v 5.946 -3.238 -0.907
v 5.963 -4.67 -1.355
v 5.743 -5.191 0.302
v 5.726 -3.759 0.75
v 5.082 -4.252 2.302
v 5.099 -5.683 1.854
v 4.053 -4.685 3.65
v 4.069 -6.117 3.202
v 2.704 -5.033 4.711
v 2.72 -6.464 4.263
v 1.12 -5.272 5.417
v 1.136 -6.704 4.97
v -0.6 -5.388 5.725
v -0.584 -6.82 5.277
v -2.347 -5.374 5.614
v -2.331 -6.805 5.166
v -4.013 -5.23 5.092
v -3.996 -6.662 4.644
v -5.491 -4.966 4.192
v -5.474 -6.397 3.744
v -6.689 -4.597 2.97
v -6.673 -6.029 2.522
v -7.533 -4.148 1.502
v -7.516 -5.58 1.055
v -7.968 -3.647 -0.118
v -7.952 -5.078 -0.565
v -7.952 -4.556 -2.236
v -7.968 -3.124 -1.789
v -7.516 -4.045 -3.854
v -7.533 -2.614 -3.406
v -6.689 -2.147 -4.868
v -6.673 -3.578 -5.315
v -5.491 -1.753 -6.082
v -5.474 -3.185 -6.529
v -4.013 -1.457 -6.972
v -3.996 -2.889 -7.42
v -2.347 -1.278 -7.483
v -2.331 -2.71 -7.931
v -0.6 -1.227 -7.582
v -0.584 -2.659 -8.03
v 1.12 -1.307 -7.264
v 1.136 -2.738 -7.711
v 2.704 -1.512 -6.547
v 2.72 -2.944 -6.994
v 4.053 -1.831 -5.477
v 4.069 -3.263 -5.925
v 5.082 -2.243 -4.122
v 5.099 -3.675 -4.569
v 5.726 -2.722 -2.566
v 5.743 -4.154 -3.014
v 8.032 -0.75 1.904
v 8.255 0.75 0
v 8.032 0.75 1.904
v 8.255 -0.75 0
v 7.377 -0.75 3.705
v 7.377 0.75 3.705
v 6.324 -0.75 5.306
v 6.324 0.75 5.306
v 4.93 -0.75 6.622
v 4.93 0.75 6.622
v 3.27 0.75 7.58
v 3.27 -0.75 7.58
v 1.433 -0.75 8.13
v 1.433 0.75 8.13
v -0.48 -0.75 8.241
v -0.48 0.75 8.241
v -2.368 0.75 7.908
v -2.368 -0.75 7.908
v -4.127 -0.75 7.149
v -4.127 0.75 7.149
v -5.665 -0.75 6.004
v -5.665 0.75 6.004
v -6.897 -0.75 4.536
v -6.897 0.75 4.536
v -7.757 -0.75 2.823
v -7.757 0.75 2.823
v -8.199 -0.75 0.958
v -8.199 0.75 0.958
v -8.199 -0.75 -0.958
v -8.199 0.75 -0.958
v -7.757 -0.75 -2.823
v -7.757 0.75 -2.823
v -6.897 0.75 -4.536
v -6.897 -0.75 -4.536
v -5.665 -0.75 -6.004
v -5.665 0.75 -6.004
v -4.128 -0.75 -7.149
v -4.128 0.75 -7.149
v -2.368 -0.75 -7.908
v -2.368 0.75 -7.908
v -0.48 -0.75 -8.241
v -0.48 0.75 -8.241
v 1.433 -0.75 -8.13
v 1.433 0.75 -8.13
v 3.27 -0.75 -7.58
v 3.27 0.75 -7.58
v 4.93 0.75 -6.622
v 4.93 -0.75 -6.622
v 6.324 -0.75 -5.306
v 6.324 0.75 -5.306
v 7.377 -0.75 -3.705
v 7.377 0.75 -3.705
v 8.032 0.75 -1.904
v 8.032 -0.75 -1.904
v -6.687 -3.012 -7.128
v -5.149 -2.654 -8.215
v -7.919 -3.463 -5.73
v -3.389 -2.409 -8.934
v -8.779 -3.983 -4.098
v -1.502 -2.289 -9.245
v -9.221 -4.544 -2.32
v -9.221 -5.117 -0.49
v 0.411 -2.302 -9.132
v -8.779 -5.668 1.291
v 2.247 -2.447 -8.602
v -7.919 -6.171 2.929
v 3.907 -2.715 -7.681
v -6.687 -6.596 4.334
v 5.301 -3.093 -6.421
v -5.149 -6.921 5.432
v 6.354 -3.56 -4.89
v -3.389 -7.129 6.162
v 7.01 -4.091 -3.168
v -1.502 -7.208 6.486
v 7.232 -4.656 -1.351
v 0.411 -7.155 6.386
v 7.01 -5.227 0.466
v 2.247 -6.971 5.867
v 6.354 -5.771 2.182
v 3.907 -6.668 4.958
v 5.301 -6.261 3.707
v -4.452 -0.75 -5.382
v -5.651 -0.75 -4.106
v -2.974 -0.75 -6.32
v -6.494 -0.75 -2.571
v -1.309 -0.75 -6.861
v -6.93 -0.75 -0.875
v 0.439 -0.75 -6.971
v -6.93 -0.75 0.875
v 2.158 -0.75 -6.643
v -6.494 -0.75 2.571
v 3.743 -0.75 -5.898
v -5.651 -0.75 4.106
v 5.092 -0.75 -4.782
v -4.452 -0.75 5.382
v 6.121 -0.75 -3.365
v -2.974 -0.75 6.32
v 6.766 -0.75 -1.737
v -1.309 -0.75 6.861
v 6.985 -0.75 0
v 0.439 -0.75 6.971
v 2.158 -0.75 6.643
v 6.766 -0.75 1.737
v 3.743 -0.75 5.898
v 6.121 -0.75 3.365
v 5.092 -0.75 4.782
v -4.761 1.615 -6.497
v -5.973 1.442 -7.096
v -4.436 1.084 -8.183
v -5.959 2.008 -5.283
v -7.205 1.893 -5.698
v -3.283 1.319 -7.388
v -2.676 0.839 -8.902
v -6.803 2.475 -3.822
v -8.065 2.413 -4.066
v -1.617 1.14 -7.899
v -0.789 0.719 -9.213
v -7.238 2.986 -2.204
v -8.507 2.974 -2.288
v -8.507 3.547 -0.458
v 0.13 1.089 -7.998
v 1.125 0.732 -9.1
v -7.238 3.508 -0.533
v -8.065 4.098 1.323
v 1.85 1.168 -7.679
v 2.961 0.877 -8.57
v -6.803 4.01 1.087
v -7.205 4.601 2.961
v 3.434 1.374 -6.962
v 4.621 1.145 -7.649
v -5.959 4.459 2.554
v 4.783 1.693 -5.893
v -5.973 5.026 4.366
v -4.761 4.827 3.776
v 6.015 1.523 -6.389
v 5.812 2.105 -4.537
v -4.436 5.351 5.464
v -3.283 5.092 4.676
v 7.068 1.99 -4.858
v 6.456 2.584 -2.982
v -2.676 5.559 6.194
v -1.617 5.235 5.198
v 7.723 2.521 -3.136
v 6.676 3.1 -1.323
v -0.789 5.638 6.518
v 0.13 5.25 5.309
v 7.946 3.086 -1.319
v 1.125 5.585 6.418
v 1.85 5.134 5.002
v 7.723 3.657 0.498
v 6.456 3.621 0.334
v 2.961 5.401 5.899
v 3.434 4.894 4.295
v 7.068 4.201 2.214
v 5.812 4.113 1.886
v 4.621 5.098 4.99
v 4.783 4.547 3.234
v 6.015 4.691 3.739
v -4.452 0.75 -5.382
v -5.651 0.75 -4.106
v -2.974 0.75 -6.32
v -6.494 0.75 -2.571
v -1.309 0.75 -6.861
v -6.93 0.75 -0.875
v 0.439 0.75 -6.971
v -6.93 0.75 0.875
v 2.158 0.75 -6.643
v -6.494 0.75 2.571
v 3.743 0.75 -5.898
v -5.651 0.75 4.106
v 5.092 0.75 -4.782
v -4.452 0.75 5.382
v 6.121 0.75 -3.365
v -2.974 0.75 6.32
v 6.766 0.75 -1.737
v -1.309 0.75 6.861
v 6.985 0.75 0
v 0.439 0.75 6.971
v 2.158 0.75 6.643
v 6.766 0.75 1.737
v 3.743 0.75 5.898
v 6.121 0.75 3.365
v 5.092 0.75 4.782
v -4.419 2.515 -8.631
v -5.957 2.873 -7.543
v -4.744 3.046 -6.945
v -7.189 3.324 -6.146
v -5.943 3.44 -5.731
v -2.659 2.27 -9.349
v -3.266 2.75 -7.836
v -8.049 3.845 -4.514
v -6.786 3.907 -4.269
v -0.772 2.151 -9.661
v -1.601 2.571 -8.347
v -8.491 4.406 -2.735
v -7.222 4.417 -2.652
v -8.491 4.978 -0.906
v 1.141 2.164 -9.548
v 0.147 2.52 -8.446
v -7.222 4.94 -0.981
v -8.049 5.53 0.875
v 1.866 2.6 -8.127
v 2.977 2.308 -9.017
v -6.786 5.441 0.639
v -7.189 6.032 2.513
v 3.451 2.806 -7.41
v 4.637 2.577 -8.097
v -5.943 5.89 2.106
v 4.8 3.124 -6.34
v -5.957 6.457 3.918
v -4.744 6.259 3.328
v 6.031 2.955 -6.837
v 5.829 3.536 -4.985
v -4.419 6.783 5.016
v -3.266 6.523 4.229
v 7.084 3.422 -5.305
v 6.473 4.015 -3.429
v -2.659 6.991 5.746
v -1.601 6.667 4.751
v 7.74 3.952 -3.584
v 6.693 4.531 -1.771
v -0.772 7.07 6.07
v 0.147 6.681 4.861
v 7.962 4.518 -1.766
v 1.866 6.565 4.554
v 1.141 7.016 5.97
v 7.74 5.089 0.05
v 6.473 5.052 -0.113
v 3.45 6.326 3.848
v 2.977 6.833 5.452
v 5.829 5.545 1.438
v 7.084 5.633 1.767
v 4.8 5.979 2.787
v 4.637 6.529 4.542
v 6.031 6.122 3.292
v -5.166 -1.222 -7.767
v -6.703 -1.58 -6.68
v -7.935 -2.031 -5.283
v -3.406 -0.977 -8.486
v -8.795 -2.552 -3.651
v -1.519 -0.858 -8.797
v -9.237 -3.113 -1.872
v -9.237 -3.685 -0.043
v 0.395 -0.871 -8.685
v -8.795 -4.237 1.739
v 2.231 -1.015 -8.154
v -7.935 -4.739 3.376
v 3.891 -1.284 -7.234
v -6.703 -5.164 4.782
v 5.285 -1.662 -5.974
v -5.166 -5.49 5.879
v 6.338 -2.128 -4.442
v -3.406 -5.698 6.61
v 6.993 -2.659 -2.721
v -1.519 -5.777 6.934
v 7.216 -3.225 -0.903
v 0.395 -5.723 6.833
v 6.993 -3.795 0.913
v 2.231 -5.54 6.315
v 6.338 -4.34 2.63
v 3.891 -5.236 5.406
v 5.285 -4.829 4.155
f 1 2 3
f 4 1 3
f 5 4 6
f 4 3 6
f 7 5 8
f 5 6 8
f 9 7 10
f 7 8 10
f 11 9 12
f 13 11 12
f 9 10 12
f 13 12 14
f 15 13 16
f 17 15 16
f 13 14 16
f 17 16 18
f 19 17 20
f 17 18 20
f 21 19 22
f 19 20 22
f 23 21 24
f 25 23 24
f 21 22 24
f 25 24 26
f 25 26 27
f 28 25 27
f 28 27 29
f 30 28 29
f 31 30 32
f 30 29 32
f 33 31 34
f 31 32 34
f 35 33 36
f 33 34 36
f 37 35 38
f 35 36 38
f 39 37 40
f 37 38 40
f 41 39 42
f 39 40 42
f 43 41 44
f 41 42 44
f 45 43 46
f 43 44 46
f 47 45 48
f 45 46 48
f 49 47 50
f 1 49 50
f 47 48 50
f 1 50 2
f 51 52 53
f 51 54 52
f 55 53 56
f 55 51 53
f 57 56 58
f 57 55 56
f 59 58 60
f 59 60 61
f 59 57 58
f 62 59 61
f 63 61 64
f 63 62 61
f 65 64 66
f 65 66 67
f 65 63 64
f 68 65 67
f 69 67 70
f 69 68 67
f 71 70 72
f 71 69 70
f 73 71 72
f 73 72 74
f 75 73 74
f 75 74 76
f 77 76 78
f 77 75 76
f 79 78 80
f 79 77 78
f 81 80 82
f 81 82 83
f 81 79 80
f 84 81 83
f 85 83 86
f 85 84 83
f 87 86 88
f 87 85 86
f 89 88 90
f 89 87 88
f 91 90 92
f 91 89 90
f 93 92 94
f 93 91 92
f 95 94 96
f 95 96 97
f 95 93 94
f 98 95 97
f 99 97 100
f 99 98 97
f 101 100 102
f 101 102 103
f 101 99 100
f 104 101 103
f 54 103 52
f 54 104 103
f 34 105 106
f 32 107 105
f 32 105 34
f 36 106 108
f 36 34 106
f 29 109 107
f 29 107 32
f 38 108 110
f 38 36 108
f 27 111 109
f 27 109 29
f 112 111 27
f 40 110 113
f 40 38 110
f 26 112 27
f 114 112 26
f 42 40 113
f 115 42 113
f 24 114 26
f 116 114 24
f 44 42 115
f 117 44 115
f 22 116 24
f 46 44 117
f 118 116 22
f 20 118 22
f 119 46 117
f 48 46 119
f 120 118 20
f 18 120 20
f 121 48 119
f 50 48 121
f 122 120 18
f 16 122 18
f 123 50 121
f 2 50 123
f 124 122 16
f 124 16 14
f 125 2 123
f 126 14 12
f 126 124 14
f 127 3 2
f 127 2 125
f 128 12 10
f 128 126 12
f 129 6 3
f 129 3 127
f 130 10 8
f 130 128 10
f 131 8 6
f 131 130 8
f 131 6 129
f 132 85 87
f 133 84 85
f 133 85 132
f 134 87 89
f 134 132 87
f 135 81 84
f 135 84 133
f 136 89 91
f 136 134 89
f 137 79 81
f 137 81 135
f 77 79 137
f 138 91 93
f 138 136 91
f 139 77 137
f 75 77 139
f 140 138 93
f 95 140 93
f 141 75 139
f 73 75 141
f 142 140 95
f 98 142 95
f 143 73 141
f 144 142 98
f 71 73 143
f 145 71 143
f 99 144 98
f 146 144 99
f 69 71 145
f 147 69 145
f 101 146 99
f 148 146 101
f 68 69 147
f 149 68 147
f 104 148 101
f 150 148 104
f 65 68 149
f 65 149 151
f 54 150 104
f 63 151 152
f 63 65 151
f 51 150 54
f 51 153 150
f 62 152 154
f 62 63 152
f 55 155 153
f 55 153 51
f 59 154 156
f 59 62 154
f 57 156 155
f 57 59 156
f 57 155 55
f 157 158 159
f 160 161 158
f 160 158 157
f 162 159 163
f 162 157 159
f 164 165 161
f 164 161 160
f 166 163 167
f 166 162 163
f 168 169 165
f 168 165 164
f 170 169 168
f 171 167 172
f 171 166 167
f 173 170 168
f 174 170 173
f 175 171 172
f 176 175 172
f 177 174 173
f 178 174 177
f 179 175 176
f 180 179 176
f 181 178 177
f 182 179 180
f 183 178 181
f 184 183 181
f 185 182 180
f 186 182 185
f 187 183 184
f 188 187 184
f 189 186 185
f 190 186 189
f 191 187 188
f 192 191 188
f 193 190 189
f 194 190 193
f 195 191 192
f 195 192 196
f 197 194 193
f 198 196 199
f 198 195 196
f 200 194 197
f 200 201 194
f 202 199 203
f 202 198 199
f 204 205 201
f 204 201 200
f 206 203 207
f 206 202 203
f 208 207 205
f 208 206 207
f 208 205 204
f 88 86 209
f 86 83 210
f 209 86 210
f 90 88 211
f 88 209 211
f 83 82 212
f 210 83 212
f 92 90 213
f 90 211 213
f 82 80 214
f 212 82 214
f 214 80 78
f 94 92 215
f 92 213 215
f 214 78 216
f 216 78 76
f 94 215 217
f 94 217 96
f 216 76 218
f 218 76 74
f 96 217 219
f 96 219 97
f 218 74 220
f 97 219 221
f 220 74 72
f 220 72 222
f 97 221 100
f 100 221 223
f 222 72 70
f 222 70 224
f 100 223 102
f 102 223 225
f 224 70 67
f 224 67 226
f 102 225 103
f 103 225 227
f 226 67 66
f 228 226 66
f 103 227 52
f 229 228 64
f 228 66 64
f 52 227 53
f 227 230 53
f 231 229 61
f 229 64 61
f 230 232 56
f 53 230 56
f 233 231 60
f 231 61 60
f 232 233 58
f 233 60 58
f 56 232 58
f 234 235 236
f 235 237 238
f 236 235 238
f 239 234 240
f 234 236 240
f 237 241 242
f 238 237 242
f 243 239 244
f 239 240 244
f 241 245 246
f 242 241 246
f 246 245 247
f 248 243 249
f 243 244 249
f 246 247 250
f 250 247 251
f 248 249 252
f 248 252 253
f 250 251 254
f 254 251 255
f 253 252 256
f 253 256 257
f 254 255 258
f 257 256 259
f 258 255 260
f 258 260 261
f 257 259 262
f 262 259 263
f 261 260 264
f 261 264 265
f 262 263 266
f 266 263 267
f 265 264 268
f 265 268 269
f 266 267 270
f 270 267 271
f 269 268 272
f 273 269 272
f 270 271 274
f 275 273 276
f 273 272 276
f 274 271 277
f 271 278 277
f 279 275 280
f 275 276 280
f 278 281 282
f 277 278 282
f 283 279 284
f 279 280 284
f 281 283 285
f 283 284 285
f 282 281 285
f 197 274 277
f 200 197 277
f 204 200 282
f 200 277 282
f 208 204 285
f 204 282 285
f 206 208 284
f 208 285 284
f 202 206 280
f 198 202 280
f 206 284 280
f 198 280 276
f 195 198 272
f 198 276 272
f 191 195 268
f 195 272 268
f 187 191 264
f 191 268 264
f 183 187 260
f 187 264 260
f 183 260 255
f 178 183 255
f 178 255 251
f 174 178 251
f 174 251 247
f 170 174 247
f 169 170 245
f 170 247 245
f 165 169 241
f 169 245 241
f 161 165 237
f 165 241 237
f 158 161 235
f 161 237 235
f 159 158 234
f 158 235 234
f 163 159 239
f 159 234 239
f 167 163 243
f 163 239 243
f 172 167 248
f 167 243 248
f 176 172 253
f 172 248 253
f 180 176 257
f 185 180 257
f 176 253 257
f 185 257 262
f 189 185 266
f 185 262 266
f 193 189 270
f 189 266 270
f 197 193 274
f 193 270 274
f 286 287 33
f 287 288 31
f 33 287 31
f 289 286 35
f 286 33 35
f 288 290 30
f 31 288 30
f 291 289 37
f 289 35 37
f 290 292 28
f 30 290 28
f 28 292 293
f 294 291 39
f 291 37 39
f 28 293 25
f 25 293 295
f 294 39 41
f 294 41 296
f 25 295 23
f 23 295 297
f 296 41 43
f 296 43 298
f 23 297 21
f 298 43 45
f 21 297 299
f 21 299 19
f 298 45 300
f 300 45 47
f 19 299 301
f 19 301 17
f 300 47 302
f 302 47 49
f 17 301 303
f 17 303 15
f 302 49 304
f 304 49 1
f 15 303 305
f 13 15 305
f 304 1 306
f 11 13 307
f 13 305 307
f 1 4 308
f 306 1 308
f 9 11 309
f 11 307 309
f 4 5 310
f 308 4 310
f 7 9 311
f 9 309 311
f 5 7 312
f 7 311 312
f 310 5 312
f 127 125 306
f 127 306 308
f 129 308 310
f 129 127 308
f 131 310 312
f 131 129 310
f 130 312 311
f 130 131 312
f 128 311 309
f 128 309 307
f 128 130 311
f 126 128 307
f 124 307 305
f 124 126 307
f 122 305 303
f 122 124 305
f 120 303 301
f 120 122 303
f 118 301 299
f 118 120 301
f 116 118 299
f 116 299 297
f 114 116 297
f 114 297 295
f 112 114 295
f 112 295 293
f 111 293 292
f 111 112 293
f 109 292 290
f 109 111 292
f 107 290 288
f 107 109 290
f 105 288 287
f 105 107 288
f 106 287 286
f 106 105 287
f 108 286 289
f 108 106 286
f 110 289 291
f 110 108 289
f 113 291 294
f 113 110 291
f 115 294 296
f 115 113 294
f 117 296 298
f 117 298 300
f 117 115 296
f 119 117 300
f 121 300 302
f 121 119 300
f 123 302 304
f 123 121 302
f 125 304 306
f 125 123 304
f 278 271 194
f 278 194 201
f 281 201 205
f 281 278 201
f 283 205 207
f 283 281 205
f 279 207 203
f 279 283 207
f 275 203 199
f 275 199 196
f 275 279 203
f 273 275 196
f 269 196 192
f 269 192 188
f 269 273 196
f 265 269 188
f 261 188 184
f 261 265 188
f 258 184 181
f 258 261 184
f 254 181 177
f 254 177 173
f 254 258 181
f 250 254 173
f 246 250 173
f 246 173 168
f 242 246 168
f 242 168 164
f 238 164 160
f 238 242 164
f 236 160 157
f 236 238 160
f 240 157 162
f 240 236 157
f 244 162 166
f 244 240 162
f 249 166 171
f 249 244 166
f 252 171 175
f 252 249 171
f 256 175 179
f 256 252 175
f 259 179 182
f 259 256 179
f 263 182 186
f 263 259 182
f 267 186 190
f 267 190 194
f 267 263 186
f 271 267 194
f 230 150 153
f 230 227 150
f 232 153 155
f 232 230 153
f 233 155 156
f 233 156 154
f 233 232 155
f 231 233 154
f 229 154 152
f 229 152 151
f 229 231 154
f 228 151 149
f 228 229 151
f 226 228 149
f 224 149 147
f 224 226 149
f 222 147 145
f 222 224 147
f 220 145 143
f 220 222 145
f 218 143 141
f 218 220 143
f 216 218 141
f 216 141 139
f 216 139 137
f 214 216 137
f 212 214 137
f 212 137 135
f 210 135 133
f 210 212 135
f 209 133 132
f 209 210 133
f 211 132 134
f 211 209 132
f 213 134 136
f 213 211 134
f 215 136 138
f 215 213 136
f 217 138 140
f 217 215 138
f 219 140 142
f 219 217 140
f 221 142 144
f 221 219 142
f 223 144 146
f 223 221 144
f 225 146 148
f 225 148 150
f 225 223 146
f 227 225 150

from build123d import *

# Parameters (mm, degrees)
F7_R      = 8.255
F7_R_2    = 6.985
F8_DEPTH  = 1.5
F5_R      = 8.255
F5_R_2    = 6.985
F9_DEPTH  = 0.75
F6_R      = 8.255
F6_R_2    = 6.985
F10_DEPTH = 1.5


with BuildPart() as f8:
    # F7 (on face) → F8 (new body)
    with BuildSketch(Plane(origin=(0.054607, -4.702362, -1.470471), x_dir=(0.999939, 0.010578, 0.003308), z_dir=(0.011083, -0.954365, -0.298438))):
        with Locations((-1.076741, 0.100641)):
            Circle(F7_R)
        with Locations((-1.076741, 0.100641)):
            Circle(F7_R_2, mode=Mode.SUBTRACT)
    extrude(amount=-F8_DEPTH)


with BuildPart() as f9:
    # F5 (on Front) → F9 (new body, symmetric)
    with BuildSketch(Plane.XZ):
        Circle(F5_R)
        Circle(F5_R_2, mode=Mode.SUBTRACT)
    extrude(amount=F9_DEPTH, both=True)


with BuildPart() as f10:
    # F6 (on face) → F10 (new body)
    with BuildSketch(Plane(origin=(0.054607, 4.702362, -1.470471), x_dir=(0.999939, -0.010578, 0.003308), z_dir=(-0.011083, -0.954365, 0.298438))):
        with Locations((-0.346648, -0.337411)):
            Circle(F6_R)
        with Locations((-0.346648, -0.337411)):
            Circle(F6_R_2, mode=Mode.SUBTRACT)
    extrude(amount=F10_DEPTH)


solid = Compound([f8.part, f9.part, f10.part])
